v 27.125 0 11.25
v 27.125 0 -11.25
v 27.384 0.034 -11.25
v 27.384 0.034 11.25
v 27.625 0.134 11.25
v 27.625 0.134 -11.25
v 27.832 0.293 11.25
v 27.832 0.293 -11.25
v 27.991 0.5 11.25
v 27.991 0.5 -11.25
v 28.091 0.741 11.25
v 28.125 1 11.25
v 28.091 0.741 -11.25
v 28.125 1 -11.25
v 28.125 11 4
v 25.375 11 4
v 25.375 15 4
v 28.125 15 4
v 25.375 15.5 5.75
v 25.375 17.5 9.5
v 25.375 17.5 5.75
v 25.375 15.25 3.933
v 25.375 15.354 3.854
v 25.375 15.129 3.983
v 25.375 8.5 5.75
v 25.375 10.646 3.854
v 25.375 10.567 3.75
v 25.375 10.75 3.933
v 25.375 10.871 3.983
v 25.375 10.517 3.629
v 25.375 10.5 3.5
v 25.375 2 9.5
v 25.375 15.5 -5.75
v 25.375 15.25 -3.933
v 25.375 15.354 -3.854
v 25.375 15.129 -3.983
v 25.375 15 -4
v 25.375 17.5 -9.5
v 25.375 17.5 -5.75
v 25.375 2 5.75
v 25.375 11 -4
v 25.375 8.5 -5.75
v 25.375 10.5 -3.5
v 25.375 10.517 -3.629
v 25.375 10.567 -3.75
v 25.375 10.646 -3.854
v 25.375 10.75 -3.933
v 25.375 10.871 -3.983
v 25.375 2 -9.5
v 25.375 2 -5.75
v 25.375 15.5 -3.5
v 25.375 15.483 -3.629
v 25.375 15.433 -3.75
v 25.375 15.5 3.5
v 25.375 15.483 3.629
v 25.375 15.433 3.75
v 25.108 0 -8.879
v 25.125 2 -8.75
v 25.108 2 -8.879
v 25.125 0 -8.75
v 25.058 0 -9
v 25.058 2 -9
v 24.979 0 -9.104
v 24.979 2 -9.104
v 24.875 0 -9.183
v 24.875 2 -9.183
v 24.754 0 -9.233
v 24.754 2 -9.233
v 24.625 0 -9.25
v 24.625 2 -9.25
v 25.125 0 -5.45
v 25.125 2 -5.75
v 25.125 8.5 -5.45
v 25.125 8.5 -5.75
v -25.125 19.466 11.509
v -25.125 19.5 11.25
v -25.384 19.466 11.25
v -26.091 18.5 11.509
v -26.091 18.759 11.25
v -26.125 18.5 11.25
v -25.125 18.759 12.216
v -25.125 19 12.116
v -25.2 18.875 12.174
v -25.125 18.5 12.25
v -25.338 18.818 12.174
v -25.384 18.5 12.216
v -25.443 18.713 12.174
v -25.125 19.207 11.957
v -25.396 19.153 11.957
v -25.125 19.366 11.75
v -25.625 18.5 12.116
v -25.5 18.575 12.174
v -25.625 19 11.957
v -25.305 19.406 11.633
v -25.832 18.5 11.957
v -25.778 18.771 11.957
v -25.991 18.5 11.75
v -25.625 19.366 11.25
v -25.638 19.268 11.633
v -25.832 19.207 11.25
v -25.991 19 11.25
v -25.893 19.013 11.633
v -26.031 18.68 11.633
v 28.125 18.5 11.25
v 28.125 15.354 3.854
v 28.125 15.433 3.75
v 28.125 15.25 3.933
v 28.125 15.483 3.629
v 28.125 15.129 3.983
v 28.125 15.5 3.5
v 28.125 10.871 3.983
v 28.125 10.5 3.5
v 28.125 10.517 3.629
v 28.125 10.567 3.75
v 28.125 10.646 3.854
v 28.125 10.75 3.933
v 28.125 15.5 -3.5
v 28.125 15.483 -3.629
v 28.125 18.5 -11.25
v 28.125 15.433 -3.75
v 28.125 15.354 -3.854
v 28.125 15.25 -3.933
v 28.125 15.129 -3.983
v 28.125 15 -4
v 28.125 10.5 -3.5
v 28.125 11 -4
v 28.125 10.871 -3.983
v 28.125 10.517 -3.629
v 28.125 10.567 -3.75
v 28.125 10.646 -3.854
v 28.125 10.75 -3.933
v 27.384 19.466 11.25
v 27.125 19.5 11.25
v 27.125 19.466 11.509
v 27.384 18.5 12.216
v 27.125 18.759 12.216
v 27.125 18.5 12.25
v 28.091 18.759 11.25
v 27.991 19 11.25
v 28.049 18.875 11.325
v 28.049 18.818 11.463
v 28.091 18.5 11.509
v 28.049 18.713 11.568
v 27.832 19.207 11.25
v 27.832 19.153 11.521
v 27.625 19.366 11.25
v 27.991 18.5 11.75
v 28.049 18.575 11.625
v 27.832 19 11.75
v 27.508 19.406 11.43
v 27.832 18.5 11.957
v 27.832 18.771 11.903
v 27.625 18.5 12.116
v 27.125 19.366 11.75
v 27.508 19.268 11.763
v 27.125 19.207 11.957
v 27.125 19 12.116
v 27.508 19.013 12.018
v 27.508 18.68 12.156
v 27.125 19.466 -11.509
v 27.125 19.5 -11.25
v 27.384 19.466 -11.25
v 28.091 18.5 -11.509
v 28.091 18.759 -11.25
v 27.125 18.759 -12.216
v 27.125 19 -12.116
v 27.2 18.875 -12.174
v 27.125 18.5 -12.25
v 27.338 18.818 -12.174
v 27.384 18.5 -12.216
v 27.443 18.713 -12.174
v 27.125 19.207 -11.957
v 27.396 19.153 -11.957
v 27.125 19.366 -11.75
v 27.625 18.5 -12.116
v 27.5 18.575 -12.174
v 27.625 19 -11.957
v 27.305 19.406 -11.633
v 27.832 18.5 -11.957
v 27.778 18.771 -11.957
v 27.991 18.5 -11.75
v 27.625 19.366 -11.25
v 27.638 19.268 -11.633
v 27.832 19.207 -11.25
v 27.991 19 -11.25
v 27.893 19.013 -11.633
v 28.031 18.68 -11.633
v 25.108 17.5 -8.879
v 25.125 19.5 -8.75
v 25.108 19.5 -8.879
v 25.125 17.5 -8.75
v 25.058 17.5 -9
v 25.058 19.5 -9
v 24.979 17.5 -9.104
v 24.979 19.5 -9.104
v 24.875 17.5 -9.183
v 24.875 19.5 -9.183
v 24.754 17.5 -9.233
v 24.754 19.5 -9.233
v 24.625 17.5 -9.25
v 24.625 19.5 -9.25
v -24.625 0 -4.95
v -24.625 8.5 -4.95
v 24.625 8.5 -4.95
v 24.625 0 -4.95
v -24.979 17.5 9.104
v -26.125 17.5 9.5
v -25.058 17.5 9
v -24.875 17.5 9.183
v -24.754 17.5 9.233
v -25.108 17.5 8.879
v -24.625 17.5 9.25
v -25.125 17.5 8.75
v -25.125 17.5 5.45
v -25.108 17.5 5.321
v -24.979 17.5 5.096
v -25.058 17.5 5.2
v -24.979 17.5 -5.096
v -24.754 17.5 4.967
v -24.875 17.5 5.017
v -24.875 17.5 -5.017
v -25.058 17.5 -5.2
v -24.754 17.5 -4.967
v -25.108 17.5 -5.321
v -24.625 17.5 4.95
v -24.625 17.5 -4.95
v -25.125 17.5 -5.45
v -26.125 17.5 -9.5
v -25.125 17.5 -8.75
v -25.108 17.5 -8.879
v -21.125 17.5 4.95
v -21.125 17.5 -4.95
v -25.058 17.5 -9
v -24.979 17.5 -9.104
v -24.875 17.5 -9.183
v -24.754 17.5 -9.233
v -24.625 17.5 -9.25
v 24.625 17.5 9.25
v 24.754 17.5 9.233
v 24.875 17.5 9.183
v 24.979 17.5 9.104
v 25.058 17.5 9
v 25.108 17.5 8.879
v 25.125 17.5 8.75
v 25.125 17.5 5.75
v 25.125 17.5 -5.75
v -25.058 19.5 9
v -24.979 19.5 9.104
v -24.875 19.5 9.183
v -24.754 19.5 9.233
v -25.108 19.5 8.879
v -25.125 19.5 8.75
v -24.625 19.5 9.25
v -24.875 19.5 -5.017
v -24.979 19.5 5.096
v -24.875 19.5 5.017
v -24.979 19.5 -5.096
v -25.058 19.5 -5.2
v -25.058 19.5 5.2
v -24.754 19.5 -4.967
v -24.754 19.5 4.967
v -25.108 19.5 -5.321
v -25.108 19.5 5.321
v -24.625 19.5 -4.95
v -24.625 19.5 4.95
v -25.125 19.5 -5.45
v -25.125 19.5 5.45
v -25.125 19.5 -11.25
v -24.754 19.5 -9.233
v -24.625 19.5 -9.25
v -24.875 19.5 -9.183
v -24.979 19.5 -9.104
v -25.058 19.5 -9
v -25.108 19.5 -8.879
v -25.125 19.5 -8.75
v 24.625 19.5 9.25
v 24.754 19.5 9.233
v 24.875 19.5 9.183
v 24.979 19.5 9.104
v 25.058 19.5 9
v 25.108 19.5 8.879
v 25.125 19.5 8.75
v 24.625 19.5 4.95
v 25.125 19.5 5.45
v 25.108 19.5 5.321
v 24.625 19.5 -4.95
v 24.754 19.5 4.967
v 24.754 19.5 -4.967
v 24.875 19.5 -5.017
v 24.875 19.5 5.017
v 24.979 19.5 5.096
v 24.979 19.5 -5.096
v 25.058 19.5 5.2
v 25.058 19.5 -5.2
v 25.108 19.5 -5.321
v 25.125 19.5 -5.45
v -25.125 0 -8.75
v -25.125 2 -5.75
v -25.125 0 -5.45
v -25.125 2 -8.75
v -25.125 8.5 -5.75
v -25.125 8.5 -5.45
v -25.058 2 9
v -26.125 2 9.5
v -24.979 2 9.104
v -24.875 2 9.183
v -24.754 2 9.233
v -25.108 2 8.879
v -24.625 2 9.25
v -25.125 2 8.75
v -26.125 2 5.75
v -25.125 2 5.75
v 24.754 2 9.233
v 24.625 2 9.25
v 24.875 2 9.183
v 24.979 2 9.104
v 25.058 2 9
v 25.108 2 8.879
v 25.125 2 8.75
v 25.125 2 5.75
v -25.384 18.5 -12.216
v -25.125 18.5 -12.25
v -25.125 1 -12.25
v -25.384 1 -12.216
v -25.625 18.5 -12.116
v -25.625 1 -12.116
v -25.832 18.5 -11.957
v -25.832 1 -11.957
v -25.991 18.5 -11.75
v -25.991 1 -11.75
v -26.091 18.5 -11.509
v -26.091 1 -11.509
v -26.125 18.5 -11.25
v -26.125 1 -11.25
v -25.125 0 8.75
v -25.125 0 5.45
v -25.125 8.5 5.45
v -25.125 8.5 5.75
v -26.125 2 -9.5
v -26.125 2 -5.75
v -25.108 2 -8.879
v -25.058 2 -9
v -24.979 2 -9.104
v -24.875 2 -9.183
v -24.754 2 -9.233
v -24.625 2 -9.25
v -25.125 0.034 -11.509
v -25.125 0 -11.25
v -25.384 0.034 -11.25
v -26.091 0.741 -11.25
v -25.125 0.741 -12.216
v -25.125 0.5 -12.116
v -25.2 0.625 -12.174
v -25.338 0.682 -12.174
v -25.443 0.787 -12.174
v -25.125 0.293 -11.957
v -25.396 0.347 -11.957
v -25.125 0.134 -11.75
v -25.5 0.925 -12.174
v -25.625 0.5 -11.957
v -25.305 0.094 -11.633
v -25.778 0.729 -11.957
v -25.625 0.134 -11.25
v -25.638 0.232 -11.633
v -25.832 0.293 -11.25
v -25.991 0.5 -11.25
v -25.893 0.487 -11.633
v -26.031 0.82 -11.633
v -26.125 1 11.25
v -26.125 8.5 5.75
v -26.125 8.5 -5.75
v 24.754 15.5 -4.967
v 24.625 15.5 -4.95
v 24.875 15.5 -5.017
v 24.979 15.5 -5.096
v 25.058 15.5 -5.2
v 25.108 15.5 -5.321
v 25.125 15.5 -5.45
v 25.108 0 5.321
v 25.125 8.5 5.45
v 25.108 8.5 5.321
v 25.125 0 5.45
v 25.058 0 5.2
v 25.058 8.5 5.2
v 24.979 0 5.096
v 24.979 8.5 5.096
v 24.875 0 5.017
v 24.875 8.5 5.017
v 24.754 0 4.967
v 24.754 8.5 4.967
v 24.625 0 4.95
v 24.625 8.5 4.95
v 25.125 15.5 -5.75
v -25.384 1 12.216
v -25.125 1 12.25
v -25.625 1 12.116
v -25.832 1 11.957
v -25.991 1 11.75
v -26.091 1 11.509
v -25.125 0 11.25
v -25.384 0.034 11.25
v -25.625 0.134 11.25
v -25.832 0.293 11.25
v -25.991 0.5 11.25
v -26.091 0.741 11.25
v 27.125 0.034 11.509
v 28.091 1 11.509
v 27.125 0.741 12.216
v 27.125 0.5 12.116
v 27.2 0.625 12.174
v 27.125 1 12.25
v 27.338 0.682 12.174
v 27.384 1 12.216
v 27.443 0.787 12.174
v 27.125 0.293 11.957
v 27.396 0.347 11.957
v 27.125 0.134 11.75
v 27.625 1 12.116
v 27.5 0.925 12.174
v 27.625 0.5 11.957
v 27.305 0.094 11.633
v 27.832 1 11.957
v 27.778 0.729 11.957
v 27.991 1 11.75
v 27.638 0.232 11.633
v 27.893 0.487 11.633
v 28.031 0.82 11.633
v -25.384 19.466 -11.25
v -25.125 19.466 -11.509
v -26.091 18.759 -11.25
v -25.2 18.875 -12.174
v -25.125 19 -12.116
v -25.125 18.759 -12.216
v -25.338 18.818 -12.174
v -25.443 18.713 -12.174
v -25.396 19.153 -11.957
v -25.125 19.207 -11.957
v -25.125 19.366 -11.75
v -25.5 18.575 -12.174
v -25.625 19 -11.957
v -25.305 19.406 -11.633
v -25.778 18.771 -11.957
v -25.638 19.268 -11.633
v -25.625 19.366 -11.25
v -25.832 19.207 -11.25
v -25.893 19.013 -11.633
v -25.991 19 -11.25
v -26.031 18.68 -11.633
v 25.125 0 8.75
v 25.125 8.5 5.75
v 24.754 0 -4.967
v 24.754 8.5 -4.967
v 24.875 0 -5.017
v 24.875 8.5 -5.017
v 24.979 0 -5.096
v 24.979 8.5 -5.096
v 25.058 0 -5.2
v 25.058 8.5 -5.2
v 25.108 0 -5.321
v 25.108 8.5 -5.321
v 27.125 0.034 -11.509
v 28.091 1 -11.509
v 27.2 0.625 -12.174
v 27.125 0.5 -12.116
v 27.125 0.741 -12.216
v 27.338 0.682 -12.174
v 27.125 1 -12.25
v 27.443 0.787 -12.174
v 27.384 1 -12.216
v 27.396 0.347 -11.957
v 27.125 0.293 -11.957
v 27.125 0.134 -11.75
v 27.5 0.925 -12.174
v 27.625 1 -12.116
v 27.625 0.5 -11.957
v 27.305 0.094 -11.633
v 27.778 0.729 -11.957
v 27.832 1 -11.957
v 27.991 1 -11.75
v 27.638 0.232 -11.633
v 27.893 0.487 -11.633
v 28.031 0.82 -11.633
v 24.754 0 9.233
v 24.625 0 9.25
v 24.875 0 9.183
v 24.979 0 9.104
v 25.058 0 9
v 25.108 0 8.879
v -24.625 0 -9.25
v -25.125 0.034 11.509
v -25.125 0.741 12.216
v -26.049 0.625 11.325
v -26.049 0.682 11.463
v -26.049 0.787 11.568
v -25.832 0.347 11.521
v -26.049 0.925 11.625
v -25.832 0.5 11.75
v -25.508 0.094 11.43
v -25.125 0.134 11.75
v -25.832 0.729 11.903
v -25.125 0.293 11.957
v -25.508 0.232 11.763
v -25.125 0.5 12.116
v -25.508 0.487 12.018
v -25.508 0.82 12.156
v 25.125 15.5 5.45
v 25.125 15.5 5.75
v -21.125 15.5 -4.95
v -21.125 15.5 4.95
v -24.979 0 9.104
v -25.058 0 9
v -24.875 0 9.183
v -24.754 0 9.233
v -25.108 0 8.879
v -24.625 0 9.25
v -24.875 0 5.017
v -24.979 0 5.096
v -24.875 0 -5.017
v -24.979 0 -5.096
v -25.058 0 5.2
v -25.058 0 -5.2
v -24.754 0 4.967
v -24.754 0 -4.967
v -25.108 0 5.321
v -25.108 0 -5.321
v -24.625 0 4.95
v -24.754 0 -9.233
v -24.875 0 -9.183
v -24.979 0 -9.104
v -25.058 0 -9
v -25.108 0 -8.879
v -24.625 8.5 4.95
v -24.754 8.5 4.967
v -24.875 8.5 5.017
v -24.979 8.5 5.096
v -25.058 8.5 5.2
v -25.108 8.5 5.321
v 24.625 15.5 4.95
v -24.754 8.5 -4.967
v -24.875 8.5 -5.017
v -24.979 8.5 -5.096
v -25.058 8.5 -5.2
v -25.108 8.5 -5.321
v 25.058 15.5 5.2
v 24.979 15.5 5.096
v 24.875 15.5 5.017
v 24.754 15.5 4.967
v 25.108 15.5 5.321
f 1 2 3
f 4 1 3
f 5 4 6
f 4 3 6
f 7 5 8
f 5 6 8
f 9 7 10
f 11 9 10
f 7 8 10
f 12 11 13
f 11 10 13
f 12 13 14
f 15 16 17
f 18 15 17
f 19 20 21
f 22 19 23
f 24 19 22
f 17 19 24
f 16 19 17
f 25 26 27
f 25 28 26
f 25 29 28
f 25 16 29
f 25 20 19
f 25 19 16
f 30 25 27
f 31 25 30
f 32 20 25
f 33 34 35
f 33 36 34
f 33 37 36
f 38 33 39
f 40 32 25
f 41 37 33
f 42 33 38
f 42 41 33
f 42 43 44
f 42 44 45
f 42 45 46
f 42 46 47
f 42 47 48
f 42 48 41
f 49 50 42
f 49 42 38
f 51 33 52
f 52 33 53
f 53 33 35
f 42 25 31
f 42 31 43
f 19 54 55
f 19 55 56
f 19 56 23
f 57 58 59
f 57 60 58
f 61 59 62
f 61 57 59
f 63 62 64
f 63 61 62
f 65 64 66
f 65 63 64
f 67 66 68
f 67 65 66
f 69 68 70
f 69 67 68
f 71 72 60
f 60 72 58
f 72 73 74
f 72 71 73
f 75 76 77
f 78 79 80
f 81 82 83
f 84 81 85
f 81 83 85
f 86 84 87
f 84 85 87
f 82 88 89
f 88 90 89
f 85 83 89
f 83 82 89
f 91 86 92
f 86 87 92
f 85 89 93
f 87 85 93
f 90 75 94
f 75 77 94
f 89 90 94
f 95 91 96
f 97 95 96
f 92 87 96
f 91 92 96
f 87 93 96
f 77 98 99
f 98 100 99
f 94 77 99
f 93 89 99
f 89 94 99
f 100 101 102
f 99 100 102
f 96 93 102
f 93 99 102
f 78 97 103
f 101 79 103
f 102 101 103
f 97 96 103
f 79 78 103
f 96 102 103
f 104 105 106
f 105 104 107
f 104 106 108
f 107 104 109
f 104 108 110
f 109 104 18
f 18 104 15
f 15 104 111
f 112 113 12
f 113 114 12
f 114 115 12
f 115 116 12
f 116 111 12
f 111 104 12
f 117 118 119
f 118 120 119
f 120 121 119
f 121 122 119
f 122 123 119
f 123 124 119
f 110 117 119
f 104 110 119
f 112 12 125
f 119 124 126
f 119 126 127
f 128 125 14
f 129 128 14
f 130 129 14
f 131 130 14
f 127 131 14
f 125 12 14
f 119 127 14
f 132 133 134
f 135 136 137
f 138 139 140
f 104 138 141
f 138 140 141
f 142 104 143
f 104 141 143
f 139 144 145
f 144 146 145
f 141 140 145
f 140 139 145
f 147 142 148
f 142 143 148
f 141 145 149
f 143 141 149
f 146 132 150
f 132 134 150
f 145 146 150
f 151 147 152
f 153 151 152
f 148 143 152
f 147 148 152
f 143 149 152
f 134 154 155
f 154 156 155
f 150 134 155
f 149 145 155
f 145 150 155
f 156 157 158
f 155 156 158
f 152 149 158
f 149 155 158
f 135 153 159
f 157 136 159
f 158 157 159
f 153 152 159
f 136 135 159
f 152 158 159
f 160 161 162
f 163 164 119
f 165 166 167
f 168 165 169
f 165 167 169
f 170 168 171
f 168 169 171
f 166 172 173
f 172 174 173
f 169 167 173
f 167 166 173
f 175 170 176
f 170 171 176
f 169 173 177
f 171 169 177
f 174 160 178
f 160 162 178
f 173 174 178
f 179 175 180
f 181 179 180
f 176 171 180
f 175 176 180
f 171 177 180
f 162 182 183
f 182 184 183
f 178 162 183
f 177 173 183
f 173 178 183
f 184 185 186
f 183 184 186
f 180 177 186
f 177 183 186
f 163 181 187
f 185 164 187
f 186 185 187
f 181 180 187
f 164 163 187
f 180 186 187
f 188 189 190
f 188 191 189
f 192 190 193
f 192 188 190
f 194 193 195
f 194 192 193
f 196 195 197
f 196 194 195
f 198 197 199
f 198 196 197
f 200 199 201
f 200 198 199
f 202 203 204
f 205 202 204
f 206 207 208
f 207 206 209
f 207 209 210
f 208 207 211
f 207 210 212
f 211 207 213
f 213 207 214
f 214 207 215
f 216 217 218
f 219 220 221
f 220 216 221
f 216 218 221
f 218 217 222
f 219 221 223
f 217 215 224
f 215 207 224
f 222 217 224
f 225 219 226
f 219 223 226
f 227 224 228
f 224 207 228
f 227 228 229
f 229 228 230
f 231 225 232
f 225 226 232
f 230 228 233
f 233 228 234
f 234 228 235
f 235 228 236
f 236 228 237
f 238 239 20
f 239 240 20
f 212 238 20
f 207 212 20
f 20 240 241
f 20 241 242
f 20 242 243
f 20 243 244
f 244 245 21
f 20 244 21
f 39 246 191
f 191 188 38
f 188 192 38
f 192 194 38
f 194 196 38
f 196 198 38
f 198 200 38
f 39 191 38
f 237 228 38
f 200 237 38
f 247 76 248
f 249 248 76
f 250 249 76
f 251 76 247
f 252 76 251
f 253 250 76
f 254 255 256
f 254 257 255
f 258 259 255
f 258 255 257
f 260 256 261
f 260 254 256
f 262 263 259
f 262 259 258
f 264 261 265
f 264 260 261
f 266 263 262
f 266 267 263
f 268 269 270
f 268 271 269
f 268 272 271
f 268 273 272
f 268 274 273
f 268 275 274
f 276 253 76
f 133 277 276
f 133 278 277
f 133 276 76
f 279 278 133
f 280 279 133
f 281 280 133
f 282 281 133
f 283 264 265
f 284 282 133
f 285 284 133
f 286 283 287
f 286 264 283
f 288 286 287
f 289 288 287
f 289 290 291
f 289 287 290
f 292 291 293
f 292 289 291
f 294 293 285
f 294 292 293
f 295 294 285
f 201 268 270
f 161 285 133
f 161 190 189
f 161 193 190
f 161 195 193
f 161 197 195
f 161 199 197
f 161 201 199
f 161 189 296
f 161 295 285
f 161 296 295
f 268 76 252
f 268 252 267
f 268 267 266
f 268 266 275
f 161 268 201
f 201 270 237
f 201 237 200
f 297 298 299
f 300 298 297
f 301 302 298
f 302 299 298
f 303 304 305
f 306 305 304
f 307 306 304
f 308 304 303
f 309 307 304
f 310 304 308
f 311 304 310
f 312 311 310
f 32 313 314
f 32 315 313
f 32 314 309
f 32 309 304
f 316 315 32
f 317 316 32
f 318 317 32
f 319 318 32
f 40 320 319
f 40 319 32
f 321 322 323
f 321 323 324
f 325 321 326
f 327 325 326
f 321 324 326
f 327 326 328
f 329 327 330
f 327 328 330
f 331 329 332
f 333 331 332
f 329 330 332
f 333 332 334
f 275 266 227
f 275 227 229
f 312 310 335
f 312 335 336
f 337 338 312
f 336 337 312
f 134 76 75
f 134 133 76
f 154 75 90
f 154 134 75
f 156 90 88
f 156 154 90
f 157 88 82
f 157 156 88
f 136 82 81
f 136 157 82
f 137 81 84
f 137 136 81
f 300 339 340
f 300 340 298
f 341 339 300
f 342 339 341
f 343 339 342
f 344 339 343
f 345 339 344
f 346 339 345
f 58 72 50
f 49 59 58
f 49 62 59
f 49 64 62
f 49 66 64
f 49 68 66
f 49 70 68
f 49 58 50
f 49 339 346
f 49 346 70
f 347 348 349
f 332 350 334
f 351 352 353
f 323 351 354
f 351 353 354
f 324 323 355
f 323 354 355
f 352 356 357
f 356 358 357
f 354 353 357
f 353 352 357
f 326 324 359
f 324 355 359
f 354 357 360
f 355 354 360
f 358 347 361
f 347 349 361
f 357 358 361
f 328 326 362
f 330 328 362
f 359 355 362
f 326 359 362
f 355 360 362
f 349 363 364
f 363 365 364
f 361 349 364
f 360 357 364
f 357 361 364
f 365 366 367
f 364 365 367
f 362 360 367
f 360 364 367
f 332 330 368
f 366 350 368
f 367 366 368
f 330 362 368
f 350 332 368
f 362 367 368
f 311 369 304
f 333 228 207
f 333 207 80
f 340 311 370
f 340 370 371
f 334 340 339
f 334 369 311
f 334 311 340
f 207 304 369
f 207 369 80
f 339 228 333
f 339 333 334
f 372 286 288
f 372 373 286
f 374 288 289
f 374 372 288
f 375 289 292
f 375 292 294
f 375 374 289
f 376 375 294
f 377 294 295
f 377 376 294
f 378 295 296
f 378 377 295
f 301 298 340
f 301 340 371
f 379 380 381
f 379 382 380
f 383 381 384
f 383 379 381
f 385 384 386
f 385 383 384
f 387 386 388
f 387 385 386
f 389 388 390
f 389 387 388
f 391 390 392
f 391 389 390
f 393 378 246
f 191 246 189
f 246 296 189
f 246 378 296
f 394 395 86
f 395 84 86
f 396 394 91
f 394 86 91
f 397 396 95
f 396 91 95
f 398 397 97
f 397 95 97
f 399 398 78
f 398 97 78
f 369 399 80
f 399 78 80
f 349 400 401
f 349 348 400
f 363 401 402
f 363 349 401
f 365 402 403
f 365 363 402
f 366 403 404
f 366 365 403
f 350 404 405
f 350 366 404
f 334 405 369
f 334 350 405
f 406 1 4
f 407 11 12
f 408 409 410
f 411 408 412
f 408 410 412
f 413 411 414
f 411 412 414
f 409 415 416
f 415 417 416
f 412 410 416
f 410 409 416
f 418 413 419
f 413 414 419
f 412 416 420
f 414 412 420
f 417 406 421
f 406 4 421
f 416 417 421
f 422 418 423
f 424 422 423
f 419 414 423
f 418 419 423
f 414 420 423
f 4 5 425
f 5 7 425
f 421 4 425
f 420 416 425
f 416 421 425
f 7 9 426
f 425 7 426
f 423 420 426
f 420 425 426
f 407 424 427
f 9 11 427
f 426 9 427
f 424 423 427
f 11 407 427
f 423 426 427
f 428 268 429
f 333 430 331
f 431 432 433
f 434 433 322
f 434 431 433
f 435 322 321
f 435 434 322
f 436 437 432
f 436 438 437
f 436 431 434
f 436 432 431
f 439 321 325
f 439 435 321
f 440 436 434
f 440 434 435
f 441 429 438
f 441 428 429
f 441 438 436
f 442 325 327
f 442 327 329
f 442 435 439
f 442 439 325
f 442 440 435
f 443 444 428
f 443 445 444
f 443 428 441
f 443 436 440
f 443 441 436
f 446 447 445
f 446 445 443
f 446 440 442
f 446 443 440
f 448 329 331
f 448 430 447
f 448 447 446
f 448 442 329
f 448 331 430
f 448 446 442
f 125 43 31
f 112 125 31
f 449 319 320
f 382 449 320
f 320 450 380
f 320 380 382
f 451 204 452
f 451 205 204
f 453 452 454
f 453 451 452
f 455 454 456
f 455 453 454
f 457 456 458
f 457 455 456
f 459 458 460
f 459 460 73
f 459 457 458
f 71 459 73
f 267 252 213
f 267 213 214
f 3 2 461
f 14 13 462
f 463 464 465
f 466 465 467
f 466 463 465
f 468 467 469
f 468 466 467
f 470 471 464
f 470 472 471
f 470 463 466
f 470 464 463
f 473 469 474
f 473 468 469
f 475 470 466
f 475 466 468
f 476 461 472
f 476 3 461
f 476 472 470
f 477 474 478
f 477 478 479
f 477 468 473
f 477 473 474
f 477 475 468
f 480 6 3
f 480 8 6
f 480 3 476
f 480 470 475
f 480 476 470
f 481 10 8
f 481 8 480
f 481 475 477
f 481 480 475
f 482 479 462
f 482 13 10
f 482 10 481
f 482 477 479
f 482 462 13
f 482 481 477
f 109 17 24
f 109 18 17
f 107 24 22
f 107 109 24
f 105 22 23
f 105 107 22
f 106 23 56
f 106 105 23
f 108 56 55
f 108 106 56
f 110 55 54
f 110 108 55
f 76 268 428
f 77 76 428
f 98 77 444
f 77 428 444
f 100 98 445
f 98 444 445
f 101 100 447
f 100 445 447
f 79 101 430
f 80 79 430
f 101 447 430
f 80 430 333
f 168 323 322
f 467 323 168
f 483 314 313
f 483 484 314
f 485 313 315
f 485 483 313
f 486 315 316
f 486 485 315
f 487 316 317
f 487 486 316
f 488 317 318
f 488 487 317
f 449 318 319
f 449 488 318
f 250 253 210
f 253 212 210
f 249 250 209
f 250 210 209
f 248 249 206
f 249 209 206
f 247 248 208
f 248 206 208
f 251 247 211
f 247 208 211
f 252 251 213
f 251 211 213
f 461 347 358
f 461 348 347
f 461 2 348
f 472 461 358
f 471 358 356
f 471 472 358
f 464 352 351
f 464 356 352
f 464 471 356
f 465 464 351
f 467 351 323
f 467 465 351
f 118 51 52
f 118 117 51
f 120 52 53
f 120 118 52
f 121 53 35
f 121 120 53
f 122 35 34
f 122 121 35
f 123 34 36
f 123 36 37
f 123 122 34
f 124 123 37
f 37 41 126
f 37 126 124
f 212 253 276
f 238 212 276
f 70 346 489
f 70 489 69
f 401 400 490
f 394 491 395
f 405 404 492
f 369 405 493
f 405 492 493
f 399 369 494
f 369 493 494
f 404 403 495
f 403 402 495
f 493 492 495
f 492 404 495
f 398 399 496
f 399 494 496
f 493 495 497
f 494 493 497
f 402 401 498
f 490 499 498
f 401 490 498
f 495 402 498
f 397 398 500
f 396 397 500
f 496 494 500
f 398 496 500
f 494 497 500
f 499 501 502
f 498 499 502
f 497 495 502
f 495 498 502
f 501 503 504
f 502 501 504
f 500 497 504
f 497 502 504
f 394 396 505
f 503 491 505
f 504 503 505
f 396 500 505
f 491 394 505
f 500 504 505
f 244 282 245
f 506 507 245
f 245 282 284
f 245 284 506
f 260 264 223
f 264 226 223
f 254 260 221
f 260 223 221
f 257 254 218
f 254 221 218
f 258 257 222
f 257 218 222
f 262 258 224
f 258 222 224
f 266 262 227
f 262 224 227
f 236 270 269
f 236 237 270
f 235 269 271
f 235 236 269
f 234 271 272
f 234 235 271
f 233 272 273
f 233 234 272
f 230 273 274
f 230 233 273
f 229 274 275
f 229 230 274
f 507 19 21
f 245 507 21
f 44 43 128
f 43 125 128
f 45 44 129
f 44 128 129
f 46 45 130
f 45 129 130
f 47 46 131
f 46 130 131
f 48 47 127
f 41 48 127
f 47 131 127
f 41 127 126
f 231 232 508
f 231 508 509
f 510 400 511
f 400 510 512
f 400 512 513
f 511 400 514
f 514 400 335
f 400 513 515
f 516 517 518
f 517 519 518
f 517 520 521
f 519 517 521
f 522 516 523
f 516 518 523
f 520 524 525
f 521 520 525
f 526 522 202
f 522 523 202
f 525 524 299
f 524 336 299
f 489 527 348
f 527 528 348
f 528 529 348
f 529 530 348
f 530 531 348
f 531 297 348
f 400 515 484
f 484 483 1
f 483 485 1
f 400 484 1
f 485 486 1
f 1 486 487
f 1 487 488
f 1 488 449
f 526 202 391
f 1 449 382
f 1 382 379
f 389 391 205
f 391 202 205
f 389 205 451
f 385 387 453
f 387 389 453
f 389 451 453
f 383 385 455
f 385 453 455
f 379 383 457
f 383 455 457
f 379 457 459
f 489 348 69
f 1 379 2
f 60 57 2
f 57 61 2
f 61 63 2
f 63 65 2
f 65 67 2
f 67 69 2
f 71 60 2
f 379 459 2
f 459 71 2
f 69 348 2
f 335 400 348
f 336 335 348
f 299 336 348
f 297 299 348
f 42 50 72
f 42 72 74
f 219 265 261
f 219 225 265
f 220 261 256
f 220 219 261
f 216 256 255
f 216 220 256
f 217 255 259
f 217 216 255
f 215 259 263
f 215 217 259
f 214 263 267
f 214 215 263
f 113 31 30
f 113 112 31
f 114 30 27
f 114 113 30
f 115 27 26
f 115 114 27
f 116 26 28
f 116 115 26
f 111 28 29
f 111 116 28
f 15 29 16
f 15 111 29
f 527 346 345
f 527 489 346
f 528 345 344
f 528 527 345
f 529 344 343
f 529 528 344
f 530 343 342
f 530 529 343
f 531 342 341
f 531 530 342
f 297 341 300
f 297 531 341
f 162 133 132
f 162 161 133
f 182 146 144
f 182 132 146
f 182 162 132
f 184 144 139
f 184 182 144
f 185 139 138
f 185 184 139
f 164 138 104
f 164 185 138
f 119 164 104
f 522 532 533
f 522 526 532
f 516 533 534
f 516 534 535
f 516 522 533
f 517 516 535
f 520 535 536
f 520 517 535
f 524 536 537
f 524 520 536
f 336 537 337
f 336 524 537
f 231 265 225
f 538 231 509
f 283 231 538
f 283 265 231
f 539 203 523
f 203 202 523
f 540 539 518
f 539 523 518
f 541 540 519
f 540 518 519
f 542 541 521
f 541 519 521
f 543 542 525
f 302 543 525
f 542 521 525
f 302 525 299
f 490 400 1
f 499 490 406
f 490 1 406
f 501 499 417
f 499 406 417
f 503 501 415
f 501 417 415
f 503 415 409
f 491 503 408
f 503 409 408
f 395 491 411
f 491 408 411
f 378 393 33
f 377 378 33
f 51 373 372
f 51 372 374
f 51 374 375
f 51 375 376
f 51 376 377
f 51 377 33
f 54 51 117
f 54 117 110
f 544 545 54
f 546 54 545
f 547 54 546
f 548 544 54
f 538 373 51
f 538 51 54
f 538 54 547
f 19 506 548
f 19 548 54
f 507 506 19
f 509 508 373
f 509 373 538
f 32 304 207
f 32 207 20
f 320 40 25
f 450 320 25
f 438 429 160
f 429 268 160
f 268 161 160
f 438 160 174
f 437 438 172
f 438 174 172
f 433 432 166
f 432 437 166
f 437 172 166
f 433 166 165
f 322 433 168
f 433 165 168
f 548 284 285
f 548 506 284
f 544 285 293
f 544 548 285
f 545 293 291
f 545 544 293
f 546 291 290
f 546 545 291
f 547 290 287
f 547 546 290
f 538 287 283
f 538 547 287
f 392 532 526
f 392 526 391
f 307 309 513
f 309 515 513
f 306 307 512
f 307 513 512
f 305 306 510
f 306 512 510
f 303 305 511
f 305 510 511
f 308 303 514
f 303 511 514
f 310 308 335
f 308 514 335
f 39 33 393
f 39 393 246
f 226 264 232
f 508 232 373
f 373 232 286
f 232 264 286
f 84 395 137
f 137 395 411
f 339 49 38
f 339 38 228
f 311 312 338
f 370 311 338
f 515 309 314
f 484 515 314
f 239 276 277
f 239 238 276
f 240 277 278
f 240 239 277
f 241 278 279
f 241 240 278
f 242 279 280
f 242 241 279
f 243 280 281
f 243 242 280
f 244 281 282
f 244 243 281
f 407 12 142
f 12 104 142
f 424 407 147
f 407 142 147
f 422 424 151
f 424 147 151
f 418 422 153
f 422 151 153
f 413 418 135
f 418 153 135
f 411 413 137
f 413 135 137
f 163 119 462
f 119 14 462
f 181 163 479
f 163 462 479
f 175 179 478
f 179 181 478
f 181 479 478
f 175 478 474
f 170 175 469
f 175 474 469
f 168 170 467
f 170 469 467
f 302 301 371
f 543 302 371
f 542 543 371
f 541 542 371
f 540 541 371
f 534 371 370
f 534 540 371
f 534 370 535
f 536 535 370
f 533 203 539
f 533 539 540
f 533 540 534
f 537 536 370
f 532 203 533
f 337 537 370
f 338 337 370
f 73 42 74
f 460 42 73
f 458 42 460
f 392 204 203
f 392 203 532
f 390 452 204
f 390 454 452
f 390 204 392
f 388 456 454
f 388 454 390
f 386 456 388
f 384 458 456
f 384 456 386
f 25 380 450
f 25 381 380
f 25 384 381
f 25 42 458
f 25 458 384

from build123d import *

# Parameters (mm, degrees)
SKETCH2_W           = 54.25
SKETCH2_H           = 24.5
BOSS_EXTRUDE1_DEPTH = 2
BOSS_EXTRUDE2_DEPTH = 15.5
SKETCH5_W           = 54.25
SKETCH5_H           = 24.5
BOSS_EXTRUDE3_DEPTH = 2
SKETCH6_W           = 11.5
SKETCH6_H           = 6.5
SKETCH6_H_2         = 2
BOSS_EXTRUDE4_DEPTH = 51.5
SKETCH8_W           = 50.25
SKETCH8_H           = 4.3
CUT_EXTRUDE1_DEPTH  = 37.350077373
SKETCH9_W           = 11.5
SKETCH9_H           = 2
CUT_EXTRUDE2_DEPTH  = 5
SKETCH10_W          = 8
SKETCH10_H          = 5
CUT_EXTRUDE3_DEPTH  = 5
FILLET1_R           = 0.5
FILLET2_R           = 1


with BuildPart() as part:
    # Sketch2 → Boss-Extrude1 (new body)
    with BuildSketch(Plane(origin=(0, 0, 0), x_dir=(1, 0, 0), z_dir=(0, 1, 0))):
        with Locations((1, 0)):
            Rectangle(SKETCH2_W, SKETCH2_H)
    extrude(amount=BOSS_EXTRUDE1_DEPTH)

    # Sketch3 → Boss-Extrude2 (add)
    with BuildSketch(Plane(origin=(0, 2, 0), x_dir=(1, 0, 0), z_dir=(0, 1, 0))):
        Polygon((-26.125, 12.25), (28.125, 12.25), (28.125, -12.25), (-26.125, -12.25), (-26.125, -9.5), (25.375, -9.5), (25.375, 9.5), (-26.125, 9.5), align=None)
    extrude(amount=BOSS_EXTRUDE2_DEPTH)

    # Sketch5 → Boss-Extrude3 (add)
    with BuildSketch(Plane(origin=(0, 17.5, 0), x_dir=(1, 0, 0), z_dir=(0, 1, 0))):
        with Locations((1, 0)):
            Rectangle(SKETCH5_W, SKETCH5_H)
    extrude(amount=BOSS_EXTRUDE3_DEPTH)

    # Sketch6 → Boss-Extrude4 (add)
    with BuildSketch(Plane.ZY.offset(-25.375)):
        with Locations((0, 5.25)):
            Rectangle(SKETCH6_W, SKETCH6_H)
        with Locations((0, 16.5)):
            Rectangle(SKETCH6_W, SKETCH6_H_2)
    extrude(amount=BOSS_EXTRUDE4_DEPTH)

    # Sketch8 → Cut-Extrude1 (cut, through all)
    with BuildSketch(Plane(origin=(0, 19.5, 0), x_dir=(1, 0, 0), z_dir=(0, 1, 0))):
        with Locations((0, 7.1)):
            Rectangle(SKETCH8_W, SKETCH8_H)
        with Locations((0, -7.1)):
            Rectangle(SKETCH8_W, SKETCH8_H)
    extrude(amount=-CUT_EXTRUDE1_DEPTH, mode=Mode.SUBTRACT)

    # Sketch9 → Cut-Extrude2 (cut)
    with BuildSketch(Plane.ZY.offset(26.125)):
        with Locations((0, 16.5)):
            Rectangle(SKETCH9_W, SKETCH9_H)
    extrude(amount=-CUT_EXTRUDE2_DEPTH, mode=Mode.SUBTRACT)

    # Sketch10 → Cut-Extrude3 (cut)
    with BuildSketch(Plane.ZY.offset(-25.375)):
        with Locations((0, 13)):
            Rectangle(SKETCH10_W, SKETCH10_H)
    extrude(amount=-CUT_EXTRUDE3_DEPTH, mode=Mode.SUBTRACT)

    # Fillet1
    fillet1_edges = [part.edges().sort_by_distance(p)[0] for p in [
        (-25.125, 18.5, -9.25),
        (25.125, 18.5, -9.25),
        (25.125, 4.25, -4.95),
        (25.125, 17.5, -4.95),
        (-25.125, 4.25, -4.95),
        (-25.125, 1, -9.25),
        (25.125, 1, -9.25),
        (25.125, 18.5, 9.25),
        (-25.125, 4.25, 4.95),
        (25.125, 17.5, 4.95),
        (-25.125, 18.5, 9.25),
        (25.125, 4.25, 4.95),
        (25.125, 1, 9.25),
        (-25.125, 1, 9.25),
        (-25.125, 18.5, -4.95),
        (-25.125, 18.5, 4.95),
        (26.75, 10.5, -4),
        (26.75, 15.5, -4),
        (26.75, 15.5, 4),
        (26.75, 10.5, 4),
    ]]
    fillet(fillet1_edges, radius=FILLET1_R)

    # Fillet2
    fillet2_edges = [part.edges().sort_by_distance(p)[0] for p in [
        (-26.125, 19.5, 0),
        (1, 19.5, 12.25),
        (28.125, 19.5, 0),
        (1, 19.5, -12.25),
        (28.125, 0, 0),
        (1, 0, 12.25),
        (-26.125, 0, 0),
        (1, 0, -12.25),
        (28.125, 9.75, -12.25),
        (28.125, 9.75, 12.25),
        (-26.125, 9.75, 12.25),
        (-26.125, 9.75, -12.25),
    ]]
    fillet(fillet2_edges, radius=FILLET2_R - 0.0001)  # a hair under: the kernel refuses the full size


solid = part.part
